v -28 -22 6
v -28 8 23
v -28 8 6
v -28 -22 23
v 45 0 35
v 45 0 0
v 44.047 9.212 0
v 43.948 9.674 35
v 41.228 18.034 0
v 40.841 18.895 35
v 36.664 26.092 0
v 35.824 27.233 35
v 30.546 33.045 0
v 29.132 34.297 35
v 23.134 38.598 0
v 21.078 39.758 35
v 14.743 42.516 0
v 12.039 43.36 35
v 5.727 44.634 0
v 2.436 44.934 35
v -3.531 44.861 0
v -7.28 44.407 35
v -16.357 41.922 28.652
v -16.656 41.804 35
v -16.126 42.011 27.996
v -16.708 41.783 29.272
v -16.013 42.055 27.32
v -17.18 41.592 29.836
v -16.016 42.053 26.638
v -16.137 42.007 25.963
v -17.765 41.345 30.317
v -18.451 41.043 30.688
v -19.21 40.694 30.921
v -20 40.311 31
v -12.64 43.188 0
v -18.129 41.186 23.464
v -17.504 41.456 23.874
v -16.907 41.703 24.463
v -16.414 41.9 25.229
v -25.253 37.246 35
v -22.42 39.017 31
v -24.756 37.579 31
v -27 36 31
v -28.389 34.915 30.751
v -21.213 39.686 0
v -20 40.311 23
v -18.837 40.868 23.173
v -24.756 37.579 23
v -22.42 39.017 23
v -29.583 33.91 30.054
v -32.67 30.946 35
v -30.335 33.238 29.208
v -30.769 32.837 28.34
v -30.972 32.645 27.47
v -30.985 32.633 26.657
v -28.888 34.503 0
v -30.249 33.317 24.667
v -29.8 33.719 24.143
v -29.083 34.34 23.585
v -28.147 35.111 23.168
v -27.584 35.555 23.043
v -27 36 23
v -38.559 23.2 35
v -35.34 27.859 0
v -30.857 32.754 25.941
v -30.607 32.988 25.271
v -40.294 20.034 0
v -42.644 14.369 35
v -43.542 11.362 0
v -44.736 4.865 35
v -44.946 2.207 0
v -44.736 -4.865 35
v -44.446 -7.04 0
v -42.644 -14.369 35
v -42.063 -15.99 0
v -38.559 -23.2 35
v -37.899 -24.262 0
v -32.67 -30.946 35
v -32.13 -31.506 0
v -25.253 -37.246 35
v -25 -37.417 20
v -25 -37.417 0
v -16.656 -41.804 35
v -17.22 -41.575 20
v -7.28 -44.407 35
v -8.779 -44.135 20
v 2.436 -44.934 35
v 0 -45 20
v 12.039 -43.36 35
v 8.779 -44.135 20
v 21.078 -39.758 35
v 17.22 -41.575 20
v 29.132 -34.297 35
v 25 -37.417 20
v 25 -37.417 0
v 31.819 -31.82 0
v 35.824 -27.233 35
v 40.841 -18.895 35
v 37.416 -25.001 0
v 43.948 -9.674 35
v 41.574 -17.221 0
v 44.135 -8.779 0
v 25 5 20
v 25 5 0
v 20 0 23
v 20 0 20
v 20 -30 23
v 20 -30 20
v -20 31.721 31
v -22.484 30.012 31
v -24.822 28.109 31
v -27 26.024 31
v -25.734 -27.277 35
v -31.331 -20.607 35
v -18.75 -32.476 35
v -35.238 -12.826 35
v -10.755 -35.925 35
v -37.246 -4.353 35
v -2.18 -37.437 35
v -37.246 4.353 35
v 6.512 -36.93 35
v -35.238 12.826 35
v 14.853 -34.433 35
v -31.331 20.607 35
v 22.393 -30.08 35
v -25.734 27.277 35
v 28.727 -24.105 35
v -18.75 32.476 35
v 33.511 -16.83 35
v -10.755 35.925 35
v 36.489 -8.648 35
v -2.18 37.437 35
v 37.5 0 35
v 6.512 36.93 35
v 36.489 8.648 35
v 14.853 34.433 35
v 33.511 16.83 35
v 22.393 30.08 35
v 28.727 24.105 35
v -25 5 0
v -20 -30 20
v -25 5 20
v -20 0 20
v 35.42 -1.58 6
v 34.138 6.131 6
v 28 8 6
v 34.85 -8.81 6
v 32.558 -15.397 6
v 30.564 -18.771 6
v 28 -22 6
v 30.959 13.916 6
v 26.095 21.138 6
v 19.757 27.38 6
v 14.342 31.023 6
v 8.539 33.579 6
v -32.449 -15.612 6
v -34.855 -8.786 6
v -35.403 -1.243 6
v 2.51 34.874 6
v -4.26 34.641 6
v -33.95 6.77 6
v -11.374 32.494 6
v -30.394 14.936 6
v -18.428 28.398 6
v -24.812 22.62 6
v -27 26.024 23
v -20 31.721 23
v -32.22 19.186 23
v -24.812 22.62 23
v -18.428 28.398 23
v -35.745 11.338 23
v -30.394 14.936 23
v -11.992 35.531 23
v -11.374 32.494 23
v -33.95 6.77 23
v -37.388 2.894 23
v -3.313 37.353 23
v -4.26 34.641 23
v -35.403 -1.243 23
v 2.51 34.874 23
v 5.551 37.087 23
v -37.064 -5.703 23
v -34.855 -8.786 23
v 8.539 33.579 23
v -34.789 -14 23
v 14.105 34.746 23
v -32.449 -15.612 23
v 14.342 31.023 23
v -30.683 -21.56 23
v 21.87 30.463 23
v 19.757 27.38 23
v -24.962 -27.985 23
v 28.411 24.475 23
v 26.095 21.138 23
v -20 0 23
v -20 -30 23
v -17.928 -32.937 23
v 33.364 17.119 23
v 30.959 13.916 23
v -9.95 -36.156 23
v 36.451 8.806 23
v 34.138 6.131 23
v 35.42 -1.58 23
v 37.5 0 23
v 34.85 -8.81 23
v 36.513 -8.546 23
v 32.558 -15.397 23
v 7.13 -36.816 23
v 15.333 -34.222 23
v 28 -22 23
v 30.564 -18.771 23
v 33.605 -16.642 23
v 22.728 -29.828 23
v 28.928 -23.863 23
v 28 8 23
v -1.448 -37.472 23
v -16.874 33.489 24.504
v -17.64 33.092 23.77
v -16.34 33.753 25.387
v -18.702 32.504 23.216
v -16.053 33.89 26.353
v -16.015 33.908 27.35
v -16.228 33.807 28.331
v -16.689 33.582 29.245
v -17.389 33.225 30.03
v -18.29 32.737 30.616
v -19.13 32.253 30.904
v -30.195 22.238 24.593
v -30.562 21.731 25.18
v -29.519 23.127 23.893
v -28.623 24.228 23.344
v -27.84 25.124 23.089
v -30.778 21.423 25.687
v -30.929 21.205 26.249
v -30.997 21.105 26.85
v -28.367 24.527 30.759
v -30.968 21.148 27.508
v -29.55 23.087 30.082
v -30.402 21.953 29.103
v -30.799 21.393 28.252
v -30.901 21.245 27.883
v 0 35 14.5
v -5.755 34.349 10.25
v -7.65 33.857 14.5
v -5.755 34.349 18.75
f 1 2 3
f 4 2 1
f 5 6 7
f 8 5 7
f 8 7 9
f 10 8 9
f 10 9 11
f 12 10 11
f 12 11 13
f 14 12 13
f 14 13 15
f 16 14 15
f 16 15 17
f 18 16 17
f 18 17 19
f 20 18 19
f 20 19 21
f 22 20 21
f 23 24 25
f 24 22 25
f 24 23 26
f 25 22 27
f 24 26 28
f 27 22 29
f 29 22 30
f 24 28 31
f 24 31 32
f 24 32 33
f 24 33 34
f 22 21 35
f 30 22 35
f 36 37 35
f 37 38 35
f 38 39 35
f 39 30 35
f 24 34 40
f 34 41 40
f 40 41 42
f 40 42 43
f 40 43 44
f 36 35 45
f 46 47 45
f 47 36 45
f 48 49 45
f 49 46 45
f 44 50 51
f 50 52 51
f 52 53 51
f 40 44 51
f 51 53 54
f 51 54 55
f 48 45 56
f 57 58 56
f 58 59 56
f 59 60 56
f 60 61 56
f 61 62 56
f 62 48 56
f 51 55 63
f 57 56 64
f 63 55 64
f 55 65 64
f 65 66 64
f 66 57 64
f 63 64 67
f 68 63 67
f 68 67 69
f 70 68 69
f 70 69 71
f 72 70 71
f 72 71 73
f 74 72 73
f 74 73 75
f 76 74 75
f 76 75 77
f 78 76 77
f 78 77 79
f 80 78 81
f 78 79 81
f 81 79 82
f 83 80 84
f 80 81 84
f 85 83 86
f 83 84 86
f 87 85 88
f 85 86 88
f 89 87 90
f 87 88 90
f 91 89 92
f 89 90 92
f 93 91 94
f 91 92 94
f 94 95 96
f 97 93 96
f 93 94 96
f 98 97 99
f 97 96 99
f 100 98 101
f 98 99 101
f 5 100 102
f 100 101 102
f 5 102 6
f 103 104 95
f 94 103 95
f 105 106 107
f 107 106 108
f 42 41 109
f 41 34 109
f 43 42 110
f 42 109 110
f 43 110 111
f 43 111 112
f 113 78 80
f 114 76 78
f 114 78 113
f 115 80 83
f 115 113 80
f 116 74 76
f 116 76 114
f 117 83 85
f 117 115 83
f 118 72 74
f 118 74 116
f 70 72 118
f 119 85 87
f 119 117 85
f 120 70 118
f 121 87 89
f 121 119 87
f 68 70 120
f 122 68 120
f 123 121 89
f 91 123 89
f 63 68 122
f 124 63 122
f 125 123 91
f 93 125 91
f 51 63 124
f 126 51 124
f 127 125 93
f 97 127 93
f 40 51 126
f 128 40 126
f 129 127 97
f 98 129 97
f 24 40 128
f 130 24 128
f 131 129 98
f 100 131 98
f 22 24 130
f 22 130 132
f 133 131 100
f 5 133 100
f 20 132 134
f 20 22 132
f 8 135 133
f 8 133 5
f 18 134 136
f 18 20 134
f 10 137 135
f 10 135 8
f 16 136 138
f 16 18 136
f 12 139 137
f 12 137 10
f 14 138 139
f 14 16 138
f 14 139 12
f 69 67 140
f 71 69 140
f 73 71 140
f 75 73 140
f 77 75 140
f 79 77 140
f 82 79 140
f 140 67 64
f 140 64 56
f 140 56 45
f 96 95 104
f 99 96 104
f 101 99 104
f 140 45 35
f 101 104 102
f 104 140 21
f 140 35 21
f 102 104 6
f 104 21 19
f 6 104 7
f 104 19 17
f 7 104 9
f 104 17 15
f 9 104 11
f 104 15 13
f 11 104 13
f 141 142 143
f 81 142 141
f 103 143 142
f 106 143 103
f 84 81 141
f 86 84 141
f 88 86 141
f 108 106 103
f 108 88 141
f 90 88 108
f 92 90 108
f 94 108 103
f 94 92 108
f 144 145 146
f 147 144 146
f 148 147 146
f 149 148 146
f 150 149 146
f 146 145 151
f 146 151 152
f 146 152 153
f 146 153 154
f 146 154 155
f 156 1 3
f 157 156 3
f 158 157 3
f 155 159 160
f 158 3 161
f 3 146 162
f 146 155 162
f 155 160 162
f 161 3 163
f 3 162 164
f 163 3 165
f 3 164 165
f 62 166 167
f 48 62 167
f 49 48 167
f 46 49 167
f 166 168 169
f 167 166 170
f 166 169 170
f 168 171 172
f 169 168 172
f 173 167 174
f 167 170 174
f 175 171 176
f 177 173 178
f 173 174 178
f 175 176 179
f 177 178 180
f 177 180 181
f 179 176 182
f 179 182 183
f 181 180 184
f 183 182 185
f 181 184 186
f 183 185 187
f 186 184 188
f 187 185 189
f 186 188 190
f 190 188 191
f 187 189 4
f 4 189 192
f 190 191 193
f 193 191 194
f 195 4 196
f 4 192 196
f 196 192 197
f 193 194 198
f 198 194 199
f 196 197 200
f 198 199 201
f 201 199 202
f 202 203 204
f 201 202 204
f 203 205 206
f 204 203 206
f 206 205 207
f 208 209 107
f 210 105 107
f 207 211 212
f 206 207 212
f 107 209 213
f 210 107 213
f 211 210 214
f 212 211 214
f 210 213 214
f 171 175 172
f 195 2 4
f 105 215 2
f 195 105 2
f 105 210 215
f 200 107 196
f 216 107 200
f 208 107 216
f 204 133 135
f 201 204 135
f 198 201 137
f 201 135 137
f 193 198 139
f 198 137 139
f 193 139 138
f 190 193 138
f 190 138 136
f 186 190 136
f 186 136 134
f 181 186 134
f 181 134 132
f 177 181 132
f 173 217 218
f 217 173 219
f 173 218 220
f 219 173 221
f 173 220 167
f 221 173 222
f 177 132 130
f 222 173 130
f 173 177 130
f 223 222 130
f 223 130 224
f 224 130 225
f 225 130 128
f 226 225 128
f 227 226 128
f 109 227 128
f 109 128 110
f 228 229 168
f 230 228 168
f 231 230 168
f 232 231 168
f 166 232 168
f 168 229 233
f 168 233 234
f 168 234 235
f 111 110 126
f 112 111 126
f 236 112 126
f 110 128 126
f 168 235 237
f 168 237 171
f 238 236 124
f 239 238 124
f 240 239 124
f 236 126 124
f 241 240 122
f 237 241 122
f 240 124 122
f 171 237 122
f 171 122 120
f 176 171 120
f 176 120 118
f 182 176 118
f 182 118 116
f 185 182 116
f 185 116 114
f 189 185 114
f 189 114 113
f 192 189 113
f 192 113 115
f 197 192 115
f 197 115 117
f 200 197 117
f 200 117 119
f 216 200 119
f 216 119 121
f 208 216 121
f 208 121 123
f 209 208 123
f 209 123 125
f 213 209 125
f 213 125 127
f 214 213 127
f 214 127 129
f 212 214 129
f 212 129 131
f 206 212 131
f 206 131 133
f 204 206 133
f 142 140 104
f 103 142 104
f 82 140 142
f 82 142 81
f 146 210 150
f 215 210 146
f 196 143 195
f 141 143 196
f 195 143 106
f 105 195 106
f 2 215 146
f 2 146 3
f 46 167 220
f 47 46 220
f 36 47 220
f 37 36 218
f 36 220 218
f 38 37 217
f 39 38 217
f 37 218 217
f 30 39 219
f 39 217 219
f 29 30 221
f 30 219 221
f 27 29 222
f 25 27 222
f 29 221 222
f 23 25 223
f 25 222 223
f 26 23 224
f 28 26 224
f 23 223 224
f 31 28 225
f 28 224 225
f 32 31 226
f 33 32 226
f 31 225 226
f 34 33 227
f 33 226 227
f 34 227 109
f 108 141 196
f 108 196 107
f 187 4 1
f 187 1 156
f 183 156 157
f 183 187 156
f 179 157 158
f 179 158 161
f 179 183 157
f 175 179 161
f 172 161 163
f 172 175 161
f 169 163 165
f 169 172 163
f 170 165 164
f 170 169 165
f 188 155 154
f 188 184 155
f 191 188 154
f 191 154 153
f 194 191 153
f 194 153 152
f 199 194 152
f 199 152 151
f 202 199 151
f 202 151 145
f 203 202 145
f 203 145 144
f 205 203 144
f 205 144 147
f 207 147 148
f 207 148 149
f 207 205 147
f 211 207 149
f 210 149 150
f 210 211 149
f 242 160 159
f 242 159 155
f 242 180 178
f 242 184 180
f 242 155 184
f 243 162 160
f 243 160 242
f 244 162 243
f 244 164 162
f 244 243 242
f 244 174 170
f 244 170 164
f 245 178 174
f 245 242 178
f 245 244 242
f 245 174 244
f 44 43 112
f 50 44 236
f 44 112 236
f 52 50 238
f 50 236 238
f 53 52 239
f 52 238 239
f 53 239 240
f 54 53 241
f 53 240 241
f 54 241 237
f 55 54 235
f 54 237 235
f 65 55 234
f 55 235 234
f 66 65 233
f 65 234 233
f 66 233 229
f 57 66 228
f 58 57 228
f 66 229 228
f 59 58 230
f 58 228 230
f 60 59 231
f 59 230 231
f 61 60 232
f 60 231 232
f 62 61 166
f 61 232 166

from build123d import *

# Parameters (mm, degrees)
CYLINDER_R      = 45
CYLINDER_DEPTH  = 35
SKETCH_R        = 37.5
POCKET_DEPTH    = 12
SKETCH001_W     = 50
SKETCH001_H     = 75
POCKET001_DEPTH = 20
SKETCH002_W     = 40
SKETCH002_H     = 30
POCKET002_DEPTH = 5
POCKET003_DEPTH = 17
POCKET004_DEPTH = 50


with BuildPart() as part:
    # Cylinder → Cylinder (join)
    with BuildSketch(Plane.XY):
        Circle(CYLINDER_R)
    extrude(amount=CYLINDER_DEPTH)

    # Sketch (on Face3 of Cylinder) → Pocket (cut)
    with BuildSketch(Plane.XY.offset(35)):
        Circle(SKETCH_R)
    extrude(amount=-POCKET_DEPTH, mode=Mode.SUBTRACT)

    # Sketch001 (on Face2 of Pocket) → Pocket001 (cut)
    with BuildSketch(Plane(origin=(0, 0, 0), x_dir=(1, 0, 0), z_dir=(0, 0, -1))):
        with Locations((0, 32.5)):
            Rectangle(SKETCH001_W, SKETCH001_H)
    extrude(amount=-POCKET001_DEPTH, mode=Mode.SUBTRACT)

    # Sketch002 (on Face4 of Pocket001) → Pocket002 (cut)
    with BuildSketch(Plane(origin=(0, 0, 20), x_dir=(1, 0, 0), z_dir=(0, 0, -1))):
        with Locations((0, 15)):
            Rectangle(SKETCH002_W, SKETCH002_H)
    extrude(amount=-POCKET002_DEPTH, mode=Mode.SUBTRACT)

    # Sketch003 (on Face13 of Pocket002) → Pocket003 (cut)
    with BuildSketch(Plane.XY.offset(23)):
        with BuildLine():
            Line((28, -22), (28, 8))
            Line((28, 8), (-28, 8))
            Line((-28, 8), (-28, -22))
            add(Edge.make_bspline(
                [(-28, -22), (-48, 0), (0, 70), (48, 0), (28, -22)],
                knots=[0, 0, 0, 0, 0.5, 1, 1, 1, 1], degree=3))
        make_face()
    extrude(amount=-POCKET003_DEPTH, mode=Mode.SUBTRACT)

    # Sketch004 (on DatumPlane) → Pocket004 (cut)
    with BuildSketch(Plane.XZ.offset(-5)):
        with BuildLine():
            ThreePointArc((-27, 31), (-31, 27), (-27, 23))
            Line((-27, 23), (-20, 23))
            ThreePointArc((-20, 23), (-16, 27), (-20, 31))
            Line((-20, 31), (-27, 31))
        make_face()
    extrude(amount=-POCKET004_DEPTH, mode=Mode.SUBTRACT)


solid = part.part
